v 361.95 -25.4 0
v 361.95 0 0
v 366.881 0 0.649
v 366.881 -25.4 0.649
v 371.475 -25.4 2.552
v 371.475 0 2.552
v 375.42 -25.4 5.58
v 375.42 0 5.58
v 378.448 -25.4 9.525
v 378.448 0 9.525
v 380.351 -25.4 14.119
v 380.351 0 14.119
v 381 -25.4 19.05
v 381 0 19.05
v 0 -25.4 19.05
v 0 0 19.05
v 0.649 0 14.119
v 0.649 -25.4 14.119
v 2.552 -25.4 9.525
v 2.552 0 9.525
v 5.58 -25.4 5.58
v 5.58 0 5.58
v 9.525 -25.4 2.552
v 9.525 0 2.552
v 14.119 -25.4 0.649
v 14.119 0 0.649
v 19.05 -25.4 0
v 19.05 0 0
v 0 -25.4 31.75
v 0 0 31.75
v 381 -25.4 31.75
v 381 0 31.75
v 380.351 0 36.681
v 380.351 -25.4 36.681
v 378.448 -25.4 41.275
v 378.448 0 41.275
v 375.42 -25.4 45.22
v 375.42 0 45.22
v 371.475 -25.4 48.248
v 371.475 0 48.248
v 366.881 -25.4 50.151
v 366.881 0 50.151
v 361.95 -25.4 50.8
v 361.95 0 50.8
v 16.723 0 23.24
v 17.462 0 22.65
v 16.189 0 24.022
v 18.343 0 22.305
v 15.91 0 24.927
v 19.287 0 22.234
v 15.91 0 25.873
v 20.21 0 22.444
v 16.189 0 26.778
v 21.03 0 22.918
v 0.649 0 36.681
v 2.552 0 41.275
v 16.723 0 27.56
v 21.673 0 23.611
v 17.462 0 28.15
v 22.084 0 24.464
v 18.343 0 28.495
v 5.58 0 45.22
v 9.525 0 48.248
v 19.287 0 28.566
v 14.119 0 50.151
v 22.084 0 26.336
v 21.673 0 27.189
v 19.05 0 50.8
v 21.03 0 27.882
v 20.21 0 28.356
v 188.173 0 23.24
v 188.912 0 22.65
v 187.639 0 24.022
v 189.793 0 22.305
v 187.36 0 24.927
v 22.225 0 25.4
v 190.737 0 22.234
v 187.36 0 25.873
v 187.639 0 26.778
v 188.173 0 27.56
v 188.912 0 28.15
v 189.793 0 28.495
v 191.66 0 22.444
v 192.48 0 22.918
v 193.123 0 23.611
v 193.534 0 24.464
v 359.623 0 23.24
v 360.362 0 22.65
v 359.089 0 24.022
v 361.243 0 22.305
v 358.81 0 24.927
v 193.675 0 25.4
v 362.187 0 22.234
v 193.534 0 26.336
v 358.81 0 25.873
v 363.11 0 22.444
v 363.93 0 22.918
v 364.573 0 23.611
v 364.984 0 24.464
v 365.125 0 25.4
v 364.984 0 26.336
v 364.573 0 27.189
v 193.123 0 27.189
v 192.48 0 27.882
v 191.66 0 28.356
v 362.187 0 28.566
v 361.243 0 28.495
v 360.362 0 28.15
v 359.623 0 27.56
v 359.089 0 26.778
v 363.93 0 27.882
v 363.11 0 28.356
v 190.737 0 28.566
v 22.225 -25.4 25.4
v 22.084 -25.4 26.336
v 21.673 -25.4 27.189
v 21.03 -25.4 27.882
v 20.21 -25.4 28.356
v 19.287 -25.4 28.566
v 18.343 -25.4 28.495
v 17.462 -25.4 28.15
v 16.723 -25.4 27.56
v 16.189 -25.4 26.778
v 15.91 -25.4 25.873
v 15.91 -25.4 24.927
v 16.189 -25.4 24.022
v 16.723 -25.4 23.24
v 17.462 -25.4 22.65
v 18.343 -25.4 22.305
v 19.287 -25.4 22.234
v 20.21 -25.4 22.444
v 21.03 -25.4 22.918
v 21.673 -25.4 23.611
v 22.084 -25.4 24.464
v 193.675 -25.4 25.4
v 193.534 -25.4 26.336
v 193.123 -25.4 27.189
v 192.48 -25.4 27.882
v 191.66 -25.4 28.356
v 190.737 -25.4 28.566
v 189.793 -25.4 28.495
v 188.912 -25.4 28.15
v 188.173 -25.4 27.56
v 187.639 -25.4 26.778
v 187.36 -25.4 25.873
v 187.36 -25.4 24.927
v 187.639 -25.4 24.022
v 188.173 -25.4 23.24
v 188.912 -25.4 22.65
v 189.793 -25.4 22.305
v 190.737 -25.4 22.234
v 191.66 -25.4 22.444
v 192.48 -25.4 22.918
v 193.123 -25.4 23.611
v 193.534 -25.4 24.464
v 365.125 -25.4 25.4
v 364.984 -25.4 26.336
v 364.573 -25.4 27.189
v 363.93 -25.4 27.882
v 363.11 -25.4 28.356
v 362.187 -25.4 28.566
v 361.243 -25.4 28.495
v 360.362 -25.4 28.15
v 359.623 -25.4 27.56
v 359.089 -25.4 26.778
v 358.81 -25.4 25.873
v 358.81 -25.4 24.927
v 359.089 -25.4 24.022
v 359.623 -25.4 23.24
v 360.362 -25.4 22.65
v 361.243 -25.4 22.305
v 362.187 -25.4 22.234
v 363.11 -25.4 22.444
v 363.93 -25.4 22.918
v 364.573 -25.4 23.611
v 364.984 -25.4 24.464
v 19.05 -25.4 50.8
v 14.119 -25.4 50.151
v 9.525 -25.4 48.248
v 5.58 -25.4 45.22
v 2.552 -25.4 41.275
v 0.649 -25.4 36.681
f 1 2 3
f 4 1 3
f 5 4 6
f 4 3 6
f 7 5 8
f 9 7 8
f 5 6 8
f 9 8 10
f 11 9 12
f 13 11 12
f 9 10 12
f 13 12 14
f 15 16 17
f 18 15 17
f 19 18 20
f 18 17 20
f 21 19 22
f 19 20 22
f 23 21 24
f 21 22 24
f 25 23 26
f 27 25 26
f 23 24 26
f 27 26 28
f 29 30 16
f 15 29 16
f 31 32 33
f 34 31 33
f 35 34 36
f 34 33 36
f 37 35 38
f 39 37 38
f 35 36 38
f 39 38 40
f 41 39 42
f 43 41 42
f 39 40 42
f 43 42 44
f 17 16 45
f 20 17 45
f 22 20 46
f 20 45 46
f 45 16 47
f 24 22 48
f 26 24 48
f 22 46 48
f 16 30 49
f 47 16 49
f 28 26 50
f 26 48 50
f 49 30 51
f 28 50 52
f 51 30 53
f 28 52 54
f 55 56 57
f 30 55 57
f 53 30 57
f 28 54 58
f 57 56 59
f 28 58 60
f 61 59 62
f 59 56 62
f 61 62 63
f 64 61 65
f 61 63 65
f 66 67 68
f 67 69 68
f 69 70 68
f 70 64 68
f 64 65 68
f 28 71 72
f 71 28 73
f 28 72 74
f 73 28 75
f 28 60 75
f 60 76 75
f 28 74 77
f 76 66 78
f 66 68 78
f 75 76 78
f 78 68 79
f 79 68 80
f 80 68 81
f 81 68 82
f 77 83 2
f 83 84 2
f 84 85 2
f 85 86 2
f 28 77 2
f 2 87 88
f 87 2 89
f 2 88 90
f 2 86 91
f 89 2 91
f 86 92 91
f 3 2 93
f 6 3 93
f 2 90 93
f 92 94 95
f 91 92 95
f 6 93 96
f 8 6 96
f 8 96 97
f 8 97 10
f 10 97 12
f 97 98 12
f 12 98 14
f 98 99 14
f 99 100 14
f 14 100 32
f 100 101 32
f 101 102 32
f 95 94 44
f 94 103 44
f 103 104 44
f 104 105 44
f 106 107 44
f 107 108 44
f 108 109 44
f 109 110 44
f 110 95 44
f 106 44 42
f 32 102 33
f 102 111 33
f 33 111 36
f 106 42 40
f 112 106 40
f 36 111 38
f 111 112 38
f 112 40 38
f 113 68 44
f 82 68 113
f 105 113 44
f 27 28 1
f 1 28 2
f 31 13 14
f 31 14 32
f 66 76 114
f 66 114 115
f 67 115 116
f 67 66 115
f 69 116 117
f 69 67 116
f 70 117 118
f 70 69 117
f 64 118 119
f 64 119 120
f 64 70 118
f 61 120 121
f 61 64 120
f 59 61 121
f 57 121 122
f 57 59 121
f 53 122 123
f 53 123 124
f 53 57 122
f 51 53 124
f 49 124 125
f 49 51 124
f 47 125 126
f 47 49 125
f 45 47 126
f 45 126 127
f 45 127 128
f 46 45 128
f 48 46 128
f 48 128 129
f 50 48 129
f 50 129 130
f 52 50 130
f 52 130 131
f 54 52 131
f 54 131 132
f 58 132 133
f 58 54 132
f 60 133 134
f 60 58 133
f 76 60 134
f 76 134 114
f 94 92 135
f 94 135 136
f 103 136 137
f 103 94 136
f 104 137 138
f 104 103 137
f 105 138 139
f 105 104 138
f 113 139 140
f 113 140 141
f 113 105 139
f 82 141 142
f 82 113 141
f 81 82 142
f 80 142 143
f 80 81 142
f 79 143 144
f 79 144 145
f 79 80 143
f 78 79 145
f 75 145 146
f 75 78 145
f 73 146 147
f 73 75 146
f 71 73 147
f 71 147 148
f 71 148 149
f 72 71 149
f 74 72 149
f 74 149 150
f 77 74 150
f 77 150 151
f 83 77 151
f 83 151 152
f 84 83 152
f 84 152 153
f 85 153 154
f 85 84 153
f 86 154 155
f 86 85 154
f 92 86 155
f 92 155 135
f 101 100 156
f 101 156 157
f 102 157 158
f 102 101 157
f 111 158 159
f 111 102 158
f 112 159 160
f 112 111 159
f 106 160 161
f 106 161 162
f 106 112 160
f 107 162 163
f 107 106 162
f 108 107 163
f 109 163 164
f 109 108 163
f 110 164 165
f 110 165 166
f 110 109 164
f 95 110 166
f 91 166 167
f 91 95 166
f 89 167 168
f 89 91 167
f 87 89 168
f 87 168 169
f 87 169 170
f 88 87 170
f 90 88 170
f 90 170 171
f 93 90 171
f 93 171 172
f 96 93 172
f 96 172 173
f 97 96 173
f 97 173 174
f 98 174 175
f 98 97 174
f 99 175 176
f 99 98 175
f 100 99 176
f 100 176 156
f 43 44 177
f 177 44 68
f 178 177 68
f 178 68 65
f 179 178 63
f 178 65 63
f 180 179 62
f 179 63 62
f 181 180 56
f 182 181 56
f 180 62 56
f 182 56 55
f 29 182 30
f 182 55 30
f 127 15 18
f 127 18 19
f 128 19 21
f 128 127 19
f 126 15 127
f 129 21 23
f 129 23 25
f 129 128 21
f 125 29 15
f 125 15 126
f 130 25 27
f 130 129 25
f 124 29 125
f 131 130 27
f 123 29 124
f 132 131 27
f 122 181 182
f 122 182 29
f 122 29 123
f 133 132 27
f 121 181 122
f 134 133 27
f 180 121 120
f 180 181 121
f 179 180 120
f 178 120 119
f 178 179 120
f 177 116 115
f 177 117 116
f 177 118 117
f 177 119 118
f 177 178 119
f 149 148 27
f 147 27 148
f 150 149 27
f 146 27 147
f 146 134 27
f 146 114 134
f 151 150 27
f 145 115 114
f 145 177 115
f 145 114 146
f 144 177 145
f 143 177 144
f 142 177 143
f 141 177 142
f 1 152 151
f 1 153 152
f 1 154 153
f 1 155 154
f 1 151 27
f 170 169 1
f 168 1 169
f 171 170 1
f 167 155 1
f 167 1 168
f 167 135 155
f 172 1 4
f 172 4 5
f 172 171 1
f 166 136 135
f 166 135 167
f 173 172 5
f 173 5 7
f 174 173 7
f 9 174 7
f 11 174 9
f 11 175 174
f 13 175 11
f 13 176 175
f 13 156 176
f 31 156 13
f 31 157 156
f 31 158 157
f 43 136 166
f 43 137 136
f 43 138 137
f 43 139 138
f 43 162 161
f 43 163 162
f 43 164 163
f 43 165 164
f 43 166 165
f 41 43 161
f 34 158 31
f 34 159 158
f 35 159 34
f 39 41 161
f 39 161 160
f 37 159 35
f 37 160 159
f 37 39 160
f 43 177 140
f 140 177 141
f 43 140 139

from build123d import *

# Parameters (mm, degrees)
F0_R     = 3.175
F1_DEPTH = 25.4


with BuildPart() as f1:
    # F0 (on Front) → F1 (new body)
    with BuildSketch(Plane.XZ):
        with BuildLine():
            Line((0, 31.75), (0, 19.05))
            ThreePointArc((0, 19.05), (5.579616, 5.579616), (19.05, 0))
            Line((19.05, 0), (361.95, 0))
            ThreePointArc((361.95, 0), (375.420384, 5.579616), (381, 19.05))
            Line((381, 19.05), (381, 31.75))
            ThreePointArc((381, 31.75), (375.420384, 45.220384), (361.95, 50.8))
            Line((361.95, 50.8), (19.05, 50.8))
            ThreePointArc((19.05, 50.8), (5.579616, 45.220384), (0, 31.75))
        make_face()
        with Locations((19.05, 25.4)):
            Circle(F0_R, mode=Mode.SUBTRACT)
        with Locations((190.5, 25.4)):
            Circle(F0_R, mode=Mode.SUBTRACT)
        with Locations((361.95, 25.4)):
            Circle(F0_R, mode=Mode.SUBTRACT)
    extrude(amount=F1_DEPTH)


solid = f1.part
